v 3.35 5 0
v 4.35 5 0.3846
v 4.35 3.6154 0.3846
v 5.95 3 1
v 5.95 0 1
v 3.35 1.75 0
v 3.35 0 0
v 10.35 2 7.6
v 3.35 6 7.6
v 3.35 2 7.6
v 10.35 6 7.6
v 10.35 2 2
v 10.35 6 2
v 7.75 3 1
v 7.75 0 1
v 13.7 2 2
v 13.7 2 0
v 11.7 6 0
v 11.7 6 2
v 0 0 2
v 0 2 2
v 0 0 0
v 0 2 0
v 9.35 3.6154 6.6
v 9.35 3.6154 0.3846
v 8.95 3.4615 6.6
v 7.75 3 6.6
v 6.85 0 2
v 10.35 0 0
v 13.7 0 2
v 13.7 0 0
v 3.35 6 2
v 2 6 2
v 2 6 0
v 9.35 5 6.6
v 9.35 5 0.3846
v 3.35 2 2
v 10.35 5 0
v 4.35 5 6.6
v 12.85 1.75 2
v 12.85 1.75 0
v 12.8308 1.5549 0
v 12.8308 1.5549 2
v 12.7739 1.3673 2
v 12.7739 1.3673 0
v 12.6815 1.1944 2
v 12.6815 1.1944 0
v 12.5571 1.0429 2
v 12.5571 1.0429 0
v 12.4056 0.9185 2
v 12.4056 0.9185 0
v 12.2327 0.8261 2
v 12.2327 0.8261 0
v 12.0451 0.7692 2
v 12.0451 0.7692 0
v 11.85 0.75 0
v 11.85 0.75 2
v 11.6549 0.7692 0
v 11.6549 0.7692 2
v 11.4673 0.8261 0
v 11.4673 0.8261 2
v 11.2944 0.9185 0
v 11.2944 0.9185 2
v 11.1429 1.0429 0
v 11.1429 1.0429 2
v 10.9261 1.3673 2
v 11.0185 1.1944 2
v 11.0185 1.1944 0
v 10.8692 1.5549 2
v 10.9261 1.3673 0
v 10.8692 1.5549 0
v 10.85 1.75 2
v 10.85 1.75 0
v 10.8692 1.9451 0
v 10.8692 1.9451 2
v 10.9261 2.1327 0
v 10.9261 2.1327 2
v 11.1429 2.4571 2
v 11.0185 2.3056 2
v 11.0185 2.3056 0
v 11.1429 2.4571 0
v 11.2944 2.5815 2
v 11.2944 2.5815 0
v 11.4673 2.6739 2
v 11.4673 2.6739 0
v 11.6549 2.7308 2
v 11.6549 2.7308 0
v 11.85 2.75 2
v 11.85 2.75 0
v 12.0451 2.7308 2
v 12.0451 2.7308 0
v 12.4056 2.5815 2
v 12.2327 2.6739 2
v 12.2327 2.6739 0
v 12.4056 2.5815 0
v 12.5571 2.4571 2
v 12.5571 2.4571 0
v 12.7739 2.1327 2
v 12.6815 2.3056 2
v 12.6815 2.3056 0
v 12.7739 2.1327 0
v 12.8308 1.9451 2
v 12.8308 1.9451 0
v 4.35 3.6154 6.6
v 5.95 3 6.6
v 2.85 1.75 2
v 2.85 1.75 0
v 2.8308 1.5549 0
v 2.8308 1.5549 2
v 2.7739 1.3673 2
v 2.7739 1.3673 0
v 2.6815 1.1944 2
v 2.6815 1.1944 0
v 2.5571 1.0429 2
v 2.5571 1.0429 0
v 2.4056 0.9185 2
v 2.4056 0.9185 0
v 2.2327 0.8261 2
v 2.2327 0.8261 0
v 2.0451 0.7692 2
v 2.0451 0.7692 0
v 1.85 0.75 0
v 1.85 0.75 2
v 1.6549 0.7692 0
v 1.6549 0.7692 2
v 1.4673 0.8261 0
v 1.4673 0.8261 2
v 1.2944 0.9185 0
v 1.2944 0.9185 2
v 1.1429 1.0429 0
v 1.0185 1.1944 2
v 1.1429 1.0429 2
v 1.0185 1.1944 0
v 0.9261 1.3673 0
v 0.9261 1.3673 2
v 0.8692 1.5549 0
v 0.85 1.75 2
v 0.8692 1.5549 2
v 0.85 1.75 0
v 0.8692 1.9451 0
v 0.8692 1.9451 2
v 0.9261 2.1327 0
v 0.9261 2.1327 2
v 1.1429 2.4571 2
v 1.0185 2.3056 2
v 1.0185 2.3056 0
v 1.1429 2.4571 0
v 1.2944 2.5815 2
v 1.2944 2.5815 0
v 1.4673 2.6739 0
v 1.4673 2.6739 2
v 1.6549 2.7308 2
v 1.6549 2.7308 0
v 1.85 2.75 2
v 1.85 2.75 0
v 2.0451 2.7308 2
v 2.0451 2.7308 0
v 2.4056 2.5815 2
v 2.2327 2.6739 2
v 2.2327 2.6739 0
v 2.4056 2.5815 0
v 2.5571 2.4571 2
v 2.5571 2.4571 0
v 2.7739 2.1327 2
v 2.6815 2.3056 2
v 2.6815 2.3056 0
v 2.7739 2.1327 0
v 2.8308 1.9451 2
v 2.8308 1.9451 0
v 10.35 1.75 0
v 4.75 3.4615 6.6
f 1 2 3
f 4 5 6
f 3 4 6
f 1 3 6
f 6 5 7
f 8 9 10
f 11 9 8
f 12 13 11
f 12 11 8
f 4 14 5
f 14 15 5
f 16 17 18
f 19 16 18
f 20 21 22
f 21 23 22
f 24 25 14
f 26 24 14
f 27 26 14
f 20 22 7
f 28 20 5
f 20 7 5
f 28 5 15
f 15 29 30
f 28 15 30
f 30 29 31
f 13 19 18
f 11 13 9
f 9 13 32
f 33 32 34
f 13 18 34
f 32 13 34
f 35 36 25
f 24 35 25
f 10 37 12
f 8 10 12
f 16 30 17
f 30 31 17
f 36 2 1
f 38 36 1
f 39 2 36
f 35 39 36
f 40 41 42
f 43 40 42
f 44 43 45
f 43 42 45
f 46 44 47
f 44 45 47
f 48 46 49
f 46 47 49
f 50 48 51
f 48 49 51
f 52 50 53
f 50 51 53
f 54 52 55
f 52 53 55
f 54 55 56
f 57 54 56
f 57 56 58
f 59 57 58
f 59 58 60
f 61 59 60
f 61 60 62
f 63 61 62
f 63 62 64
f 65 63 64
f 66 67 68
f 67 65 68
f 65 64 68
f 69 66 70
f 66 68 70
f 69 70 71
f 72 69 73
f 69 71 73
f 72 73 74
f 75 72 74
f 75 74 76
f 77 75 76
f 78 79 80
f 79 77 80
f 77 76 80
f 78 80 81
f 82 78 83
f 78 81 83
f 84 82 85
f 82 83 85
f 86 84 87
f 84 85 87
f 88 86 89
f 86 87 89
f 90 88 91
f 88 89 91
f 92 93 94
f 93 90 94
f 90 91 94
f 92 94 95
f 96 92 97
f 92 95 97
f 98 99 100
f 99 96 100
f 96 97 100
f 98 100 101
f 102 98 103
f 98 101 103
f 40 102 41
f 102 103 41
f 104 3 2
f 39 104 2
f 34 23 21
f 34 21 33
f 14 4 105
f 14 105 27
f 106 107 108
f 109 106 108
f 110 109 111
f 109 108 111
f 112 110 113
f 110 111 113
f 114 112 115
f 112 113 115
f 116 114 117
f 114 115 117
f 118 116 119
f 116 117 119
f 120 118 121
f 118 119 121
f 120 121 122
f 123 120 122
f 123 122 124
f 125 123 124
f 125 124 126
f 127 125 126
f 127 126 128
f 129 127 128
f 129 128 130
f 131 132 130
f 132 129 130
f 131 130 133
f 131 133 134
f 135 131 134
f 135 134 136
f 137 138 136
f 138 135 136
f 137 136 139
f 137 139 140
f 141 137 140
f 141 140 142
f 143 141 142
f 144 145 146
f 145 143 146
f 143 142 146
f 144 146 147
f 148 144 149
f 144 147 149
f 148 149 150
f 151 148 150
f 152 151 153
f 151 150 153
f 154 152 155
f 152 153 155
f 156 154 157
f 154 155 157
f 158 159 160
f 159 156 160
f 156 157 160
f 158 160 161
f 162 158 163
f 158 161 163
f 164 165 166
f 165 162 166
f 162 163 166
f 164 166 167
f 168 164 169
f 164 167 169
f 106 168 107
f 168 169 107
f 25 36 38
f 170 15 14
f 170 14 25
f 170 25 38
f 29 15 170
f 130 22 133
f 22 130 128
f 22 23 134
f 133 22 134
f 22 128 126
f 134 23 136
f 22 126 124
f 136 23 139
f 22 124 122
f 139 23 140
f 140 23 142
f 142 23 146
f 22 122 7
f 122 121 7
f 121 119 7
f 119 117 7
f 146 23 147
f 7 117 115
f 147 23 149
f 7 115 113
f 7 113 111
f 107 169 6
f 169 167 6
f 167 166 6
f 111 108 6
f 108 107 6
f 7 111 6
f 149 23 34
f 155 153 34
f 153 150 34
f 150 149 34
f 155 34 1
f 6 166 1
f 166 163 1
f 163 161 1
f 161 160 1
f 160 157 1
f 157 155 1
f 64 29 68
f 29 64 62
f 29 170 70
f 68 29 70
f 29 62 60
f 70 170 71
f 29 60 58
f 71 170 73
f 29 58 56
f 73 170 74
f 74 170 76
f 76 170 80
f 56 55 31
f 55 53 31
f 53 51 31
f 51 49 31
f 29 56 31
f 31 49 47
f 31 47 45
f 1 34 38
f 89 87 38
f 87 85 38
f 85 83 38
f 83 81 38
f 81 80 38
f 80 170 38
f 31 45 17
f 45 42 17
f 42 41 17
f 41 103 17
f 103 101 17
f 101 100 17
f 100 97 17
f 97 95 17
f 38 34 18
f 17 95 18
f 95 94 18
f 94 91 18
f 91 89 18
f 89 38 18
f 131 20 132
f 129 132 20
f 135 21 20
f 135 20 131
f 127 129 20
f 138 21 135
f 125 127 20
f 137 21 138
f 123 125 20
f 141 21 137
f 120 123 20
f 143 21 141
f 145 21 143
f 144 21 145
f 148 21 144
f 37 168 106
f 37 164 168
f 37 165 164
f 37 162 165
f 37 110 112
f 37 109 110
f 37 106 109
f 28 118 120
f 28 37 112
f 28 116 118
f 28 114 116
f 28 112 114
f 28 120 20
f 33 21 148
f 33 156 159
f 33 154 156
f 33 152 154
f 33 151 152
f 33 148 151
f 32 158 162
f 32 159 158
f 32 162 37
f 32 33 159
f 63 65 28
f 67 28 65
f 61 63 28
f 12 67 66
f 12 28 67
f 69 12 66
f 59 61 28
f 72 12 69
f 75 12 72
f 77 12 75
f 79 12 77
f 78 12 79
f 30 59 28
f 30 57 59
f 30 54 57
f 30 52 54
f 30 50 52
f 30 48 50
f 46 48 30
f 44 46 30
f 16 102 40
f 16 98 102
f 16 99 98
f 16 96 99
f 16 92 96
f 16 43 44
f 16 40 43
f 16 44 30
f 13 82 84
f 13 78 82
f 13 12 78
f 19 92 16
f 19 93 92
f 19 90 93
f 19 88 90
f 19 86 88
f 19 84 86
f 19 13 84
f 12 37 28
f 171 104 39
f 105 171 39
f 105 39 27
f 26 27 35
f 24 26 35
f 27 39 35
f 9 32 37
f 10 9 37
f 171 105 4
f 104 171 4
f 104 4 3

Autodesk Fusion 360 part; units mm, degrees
sketch "mainBase" plane through (0, 0, 0) normal (0, 0, 1) x (1, 0, 0)
  line L0 (0, 0) -> (13.7, 0)
  line L1 (13.7, 0) -> (13.7, 6)
  line L2 (13.7, 6) -> (0, 6)
  line L3 (0, 6) -> (0, 0)
  line L4 (0, 0) -> (6.85, 0)
  line L5 (6.85, 0) -> (6.85, 1.75)
  line L6 (6.85, 1.75) -> (1.85, 1.75)
  line L7 (6.85, 1.75) -> (11.85, 1.75)
  line L8 (0, 6) -> (6.85, 6)
  circle A0 centre (1.85, 1.75) radius 1
  circle A1 centre (11.85, 1.75) radius 1
  line L9 (6.85, 6) -> (3.35, 6)
  line L10 (3.35, 6) -> (3.35, 2)
  line L11 (3.35, 2) -> (6.85, 2)
  line L12 (6.85, 2) -> (6.85, 6)
  line L13 (6.85, 6) -> (10.35, 6)
  line L14 (10.35, 6) -> (10.35, 2)
  line L15 (10.35, 2) -> (6.85, 2)
  line L16 (6.85, 2) -> (6.85, 6)
  dimension "d9" = 6
  dimension "d10" = 13.7
  dimension "d11" = 6.85
  dimension "d12" = 1.75
  dimension "d13" = 5
  dimension "d14" = 5
  dimension "d15" = 6.85
  dimension "d17" = 2
  dimension "d18" = 2
  dimension "d19" = 4
  dimension "d20" = 3.5
  dimension "d21" = 4
  dimension "d22" = 3.5
extrude "Extrude1" add sketch "mainBase" along normal blind 7.6 contours L2 L8 L9 L10 L11 L12 L16 | L2 L12 L13 L14 L15 L16
shell "Shell1" thickness 1 removed faces 1 at (5.6833, 4.6667, 0)
extrude "Extrude2" add sketch "mainBase" along normal blind 2 contours L0 L1 L2 L3 L4 L8 L10 L11 L14 L15
sketch "hallCutOut" plane through (0, 0, 0) normal (0, 0, 1) x (1, 0, 0)
  line L0 (0, 6) -> (6.85, 6)
  line L1 (6.85, 6) -> (6.85, 2)
  line L2 (6.85, 2) -> (3.35, 2)
  line L3 (3.35, 2) -> (3.35, 4)
  line L4 (6.85, 2) -> (6.85, 3)
  line L5 (6.85, 3) -> (5.95, 3)
  line L6 (5.95, 3) -> (3.35, 4)
  line L7 (6.85, 3) -> (7.75, 3)
  line L8 (6.85, 2) -> (10.35, 2)
  line L9 (10.35, 2) -> (10.35, 4)
  line L10 (10.35, 4) -> (7.75, 3)
  line L11 (7.75, 3) -> (9.35, 3)
  line L12 (9.35, 3) -> (9.35, 3.6154)
  line L13 (5.95, 3) -> (4.35, 3)
  line L14 (4.35, 3) -> (4.35, 3.6154)
  line L15 (6.85, 5) -> (8.95, 5)
  line L16 (8.95, 5) -> (8.95, 3)
  line L17 (8.95, 3) -> (6.85, 3)
  line L18 (6.85, 3) -> (6.85, 5)
  line L19 (6.85, 5) -> (4.75, 5)
  line L20 (4.75, 5) -> (4.75, 3)
  line L21 (4.75, 3) -> (6.85, 3)
  line L22 (6.85, 3) -> (6.85, 5)
  line L23 (9.35, 3) -> (4.35, 3)
  line L24 (4.35, 3) -> (4.35, 5)
  line L25 (4.35, 5) -> (9.35, 5)
  line L26 (9.35, 5) -> (9.35, 3)
  dimension "d31" = 6.85
  dimension "d32" = 4
  dimension "d33" = 3.5
  dimension "d34" = 2
  dimension "d35" = 1
  dimension "d36" = 0.9
  dimension "d37" = 0.9
  dimension "d38" = 3.5
  dimension "d39" = 2
  dimension "d59" = 2.1
extrude "Extrude3" add sketch "hallCutOut" along normal blind 6.6 contours L6 L13 L20 L21 L23 | L10 L11 L16 L17 L23 | L10 L11 L12 L16 L23 L26 | L6 L13 L14 L20 L23 L24
sketch "wireCutOut" plane through (0, 0, 0) normal (0, -1, 0) x (1, 0, 0)
  line L0 (0, 0) -> (13.7, 0)
  line L1 (13.7, 0) -> (13.7, 2)
  line L2 (13.7, 2) -> (0, 2)
  line L3 (0, 2) -> (0, 0)
  line L4 (0, 0) -> (6.85, 0)
  line L5 (6.85, 0) -> (6.85, 1)
  line L6 (6.85, 1) -> (5.95, 1)
  line L7 (6.85, 1) -> (7.75, 1)
  line L8 (6.85, 0) -> (13.7, 0)
  line L9 (6.85, 0) -> (10.35, 0)
  line L10 (6.85, 0) -> (3.35, 0)
  line L11 (7.75, 1) -> (10.35, 0)
  line L12 (5.95, 1) -> (3.35, 0)
  dimension "d42" = 6.85
  dimension "d43" = 1
  dimension "d44" = 0.9
  dimension "d45" = 0.9
  dimension "d46" = 6.85
  dimension "d47" = 3.5
  dimension "d48" = 3.5
extrude "Extrude4" cut sketch "wireCutOut" against normal blind 5 contours L0 L4 L5 L6 L10 L12 | L0 L5 L7 L8 L9 L11
sketch "cutOut" plane through (0, 0, 0) normal (0, 0, 1) x (1, 0, 0)
  line L0 (0, 0) -> (13.7, 0)
  line L1 (13.7, 0) -> (13.7, 6)
  line L2 (13.7, 6) -> (0, 6)
  line L3 (0, 6) -> (0, 0)
  line L4 (13.7, 0) -> (13.7, 2)
  line L5 (0, 0) -> (0, 2)
  line L6 (0, 6) -> (2, 6)
  line L7 (13.7, 6) -> (11.7, 6)
  line L8 (0, 2) -> (2, 6)
  line L9 (13.7, 2) -> (11.7, 6)
  dimension "d51" = 6
  dimension "d52" = 13.7
  dimension "d53" = 2
  dimension "d54" = 2
  dimension "d55" = 2
  dimension "d56" = 2
extrude "Extrude5" cut sketch "cutOut" along normal blind 2 contours L2 L3 L6 L8 | L1 L2 L7 L9
extrude "Extrude6" add sketch "hallCutOut" along normal blind 7.6 contours L10 L16 L25 L26 | L6 L20 L24 L25
extrude "Extrude7" cut sketch "wireCutOut" against normal blind 5 contours L0 L4 L5 L6 L10 L12 | L0 L5 L7 L8 L9 L11
extrude "Extrude8" cut sketch "hallCutOut" along normal blind 6.6 contours L10 L16 L25 L26 | L6 L20 L24 L25
equation "baseLength = 6 mm"
equation "baseWidth = 13.7 mm"
equation "mountingCircleToMountingCircle = 10 mm"
equation "mountingHoleFromEdge = 1.75 mm"
equation "hallEffectWidth = 7 mm"
equation "hallEffectLength = 4 mm"
equation "hallEffectHeight = 7.6 mm"
equation "baseHeight = 2 mm"
equation "d9 = baseLength"
equation "d10 = baseWidth"
equation "d11 = baseWidth / 2"
equation "d12 = mountingHoleFromEdge"
equation "d13 = mountingCircleToMountingCircle / 2"
equation "d14 = mountingCircleToMountingCircle / 2"
equation "d15 = baseWidth / 2"
equation "screwHole = 2 mm"
equation "d17 = screwHole"
equation "d18 = screwHole"
equation "d19 = hallEffectLength"
equation "d20 = hallEffectWidth / 2"
equation "d21 = hallEffectLength"
equation "d22 = hallEffectWidth / 2"
equation "d23 = hallEffectHeight"
equation "hallEffectThickness = 1 mm"
equation "d26 = hallEffectThickness"
equation "d27 = baseHeight"
equation "traingleHeight = 2 mm"
equation "hallEffectMiddleDist = 1.8 mm"
equation "d31 = baseWidth / 2"
equation "d32 = hallEffectLength"
equation "d33 = hallEffectWidth / 2"
equation "d34 = traingleHeight"
equation "d35 = hallEffectThickness"
equation "d36 = hallEffectMiddleDist / 2"
equation "d37 = hallEffectMiddleDist / 2"
equation "d38 = hallEffectWidth / 2"
equation "d39 = traingleHeight"
equation "d40 = hallEffectHeight - hallEffectThickness"
equation "d42 = baseWidth / 2"
equation "d43 = hallEffectThickness"
equation "d44 = hallEffectMiddleDist / 2"
equation "d45 = hallEffectMiddleDist / 2"
equation "d46 = baseWidth / 2"
equation "d47 = hallEffectWidth / 2"
equation "d48 = hallEffectWidth / 2"
equation "d51 = baseLength"
equation "d52 = baseWidth"
equation "d53 = baseLength / 3"
equation "d54 = baseLength / 3"
equation "d57 = baseHeight"
equation "d60 = hallEffectHeight"
